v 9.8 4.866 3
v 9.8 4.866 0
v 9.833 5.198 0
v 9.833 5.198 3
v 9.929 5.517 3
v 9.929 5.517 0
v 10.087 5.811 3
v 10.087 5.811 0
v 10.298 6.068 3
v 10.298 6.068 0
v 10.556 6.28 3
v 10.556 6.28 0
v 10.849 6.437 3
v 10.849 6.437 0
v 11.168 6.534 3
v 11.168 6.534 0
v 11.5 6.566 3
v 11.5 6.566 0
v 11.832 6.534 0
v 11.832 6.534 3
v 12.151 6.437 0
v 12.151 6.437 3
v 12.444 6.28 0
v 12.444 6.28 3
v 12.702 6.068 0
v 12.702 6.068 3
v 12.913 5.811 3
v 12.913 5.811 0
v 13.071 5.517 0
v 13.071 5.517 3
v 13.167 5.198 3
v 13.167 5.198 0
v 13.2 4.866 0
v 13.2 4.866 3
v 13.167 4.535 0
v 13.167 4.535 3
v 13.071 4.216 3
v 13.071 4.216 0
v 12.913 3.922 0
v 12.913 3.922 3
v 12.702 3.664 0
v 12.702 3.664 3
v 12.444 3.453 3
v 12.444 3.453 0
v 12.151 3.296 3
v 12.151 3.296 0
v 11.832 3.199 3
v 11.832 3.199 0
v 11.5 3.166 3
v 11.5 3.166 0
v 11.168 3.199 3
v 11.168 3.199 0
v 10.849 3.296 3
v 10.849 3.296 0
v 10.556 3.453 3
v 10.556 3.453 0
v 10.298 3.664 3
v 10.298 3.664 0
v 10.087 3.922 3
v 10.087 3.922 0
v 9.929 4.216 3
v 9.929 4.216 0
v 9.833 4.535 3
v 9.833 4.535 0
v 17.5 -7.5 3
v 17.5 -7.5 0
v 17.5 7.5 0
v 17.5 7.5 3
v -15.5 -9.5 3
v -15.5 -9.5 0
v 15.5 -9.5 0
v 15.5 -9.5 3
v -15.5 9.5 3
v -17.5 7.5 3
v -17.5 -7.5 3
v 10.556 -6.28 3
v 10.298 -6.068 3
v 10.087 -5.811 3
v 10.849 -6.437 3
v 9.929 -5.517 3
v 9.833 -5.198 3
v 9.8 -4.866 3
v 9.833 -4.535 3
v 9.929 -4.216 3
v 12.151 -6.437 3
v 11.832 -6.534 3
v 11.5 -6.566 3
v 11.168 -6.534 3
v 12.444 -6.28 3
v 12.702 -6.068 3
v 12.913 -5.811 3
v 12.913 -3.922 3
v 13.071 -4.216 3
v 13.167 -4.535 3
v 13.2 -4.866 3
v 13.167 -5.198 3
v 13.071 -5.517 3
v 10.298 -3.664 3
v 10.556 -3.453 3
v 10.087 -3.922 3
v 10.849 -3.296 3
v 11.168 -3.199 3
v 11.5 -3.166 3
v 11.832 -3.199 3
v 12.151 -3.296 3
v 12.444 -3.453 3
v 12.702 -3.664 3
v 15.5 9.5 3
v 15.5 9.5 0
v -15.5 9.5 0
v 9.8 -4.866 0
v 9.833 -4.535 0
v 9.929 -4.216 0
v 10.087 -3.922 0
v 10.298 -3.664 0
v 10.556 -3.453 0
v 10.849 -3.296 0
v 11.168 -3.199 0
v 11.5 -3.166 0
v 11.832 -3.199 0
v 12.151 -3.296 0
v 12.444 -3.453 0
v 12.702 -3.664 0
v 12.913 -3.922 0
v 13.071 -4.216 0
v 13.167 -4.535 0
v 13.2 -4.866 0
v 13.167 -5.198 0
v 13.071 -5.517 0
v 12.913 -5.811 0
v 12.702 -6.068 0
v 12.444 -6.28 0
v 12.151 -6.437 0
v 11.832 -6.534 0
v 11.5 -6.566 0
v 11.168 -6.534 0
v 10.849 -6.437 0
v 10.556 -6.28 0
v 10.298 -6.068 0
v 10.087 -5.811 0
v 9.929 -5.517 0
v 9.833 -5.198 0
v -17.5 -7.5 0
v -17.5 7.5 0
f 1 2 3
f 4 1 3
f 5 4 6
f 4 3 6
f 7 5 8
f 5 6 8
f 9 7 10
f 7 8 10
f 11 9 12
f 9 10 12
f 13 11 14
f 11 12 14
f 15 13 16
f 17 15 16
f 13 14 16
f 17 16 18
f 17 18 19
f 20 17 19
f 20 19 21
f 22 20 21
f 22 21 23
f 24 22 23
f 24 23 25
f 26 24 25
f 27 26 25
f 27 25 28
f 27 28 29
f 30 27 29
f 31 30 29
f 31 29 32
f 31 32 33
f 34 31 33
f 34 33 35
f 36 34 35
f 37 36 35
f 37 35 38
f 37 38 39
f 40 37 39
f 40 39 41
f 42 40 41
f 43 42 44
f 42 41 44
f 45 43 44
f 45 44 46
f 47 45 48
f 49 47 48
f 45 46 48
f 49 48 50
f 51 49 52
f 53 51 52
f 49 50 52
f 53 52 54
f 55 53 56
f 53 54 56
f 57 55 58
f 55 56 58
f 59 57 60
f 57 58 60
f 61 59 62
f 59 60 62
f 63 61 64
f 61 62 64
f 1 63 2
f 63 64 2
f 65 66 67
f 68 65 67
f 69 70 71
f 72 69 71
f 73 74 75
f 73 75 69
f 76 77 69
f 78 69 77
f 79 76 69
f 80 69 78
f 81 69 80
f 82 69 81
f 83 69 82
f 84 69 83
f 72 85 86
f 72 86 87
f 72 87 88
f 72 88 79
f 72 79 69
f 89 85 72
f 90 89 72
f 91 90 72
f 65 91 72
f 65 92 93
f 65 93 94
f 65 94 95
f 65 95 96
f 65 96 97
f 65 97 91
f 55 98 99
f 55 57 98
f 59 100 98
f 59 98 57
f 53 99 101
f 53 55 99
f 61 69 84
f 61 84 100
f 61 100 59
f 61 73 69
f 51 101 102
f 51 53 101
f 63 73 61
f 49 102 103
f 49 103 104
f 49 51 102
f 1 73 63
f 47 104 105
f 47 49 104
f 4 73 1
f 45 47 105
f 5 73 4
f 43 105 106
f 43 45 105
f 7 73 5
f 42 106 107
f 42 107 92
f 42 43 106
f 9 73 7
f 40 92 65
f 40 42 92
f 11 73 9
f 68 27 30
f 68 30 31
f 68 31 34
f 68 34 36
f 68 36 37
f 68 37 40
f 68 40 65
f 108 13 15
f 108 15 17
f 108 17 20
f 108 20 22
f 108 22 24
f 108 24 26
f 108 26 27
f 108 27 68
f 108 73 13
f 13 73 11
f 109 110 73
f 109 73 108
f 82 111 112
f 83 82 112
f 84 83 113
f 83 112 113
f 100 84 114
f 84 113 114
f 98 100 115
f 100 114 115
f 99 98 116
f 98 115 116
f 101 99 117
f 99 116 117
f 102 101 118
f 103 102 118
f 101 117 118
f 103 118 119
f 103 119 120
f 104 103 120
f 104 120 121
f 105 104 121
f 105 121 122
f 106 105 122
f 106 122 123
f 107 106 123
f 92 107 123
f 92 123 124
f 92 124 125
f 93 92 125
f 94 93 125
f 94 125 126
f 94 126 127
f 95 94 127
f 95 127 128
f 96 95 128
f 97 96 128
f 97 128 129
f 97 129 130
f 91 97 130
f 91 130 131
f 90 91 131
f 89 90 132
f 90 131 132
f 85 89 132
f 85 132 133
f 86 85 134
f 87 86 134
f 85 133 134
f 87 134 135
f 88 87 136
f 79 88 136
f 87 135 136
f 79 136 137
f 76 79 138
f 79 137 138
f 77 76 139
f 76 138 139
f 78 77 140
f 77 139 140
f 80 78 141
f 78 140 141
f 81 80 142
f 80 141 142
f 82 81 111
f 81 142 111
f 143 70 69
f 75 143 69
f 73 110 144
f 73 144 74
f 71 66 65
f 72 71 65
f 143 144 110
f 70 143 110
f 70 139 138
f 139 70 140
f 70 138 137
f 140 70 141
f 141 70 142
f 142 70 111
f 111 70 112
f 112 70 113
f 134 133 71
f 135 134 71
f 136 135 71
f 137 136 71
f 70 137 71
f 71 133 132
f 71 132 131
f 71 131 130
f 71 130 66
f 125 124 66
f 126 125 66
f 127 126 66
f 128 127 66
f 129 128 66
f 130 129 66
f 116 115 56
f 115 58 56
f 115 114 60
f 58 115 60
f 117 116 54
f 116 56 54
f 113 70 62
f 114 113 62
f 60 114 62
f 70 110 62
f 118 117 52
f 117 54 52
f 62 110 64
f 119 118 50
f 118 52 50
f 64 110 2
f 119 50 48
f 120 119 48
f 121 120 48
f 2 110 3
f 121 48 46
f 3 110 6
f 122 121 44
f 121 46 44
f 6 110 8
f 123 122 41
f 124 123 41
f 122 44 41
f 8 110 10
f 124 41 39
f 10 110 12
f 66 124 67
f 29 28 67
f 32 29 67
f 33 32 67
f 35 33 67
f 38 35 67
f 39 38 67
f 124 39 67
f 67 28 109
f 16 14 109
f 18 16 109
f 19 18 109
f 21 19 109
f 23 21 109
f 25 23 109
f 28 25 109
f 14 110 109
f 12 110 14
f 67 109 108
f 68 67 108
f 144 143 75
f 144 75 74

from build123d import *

# Parameters (mm, degrees)
SKETCH1_W                = 35
SKETCH1_H                = 19
BOSS_EXTRUDE1_DEPTH      = 3
CHAMFER1_SIZE            = 2
M3_CLEARANCE_HOLE1_D     = 3.4
M3_CLEARANCE_HOLE1_DEPTH = 3


with BuildPart() as part:
    # Sketch1 → Boss-Extrude1 (new body)
    with BuildSketch(Plane.XY):
        Rectangle(SKETCH1_W, SKETCH1_H)
    extrude(amount=BOSS_EXTRUDE1_DEPTH)

    # Chamfer1
    chamfer1_edges = [part.edges().sort_by_distance(p)[0] for p in [
        (17.5, -9.5, 1.5),
        (-17.5, -9.5, 1.5),
        (-17.5, 9.5, 1.5),
        (17.5, 9.5, 1.5),
    ]]
    chamfer(chamfer1_edges, length=CHAMFER1_SIZE)

    # M3 Clearance Hole1
    with Locations(Plane.XY.offset(3)):
        with Locations((11.5, 4.866311679), (11.5, -4.866311679)):
            Hole(M3_CLEARANCE_HOLE1_D / 2, depth=M3_CLEARANCE_HOLE1_DEPTH)


solid = part.part
